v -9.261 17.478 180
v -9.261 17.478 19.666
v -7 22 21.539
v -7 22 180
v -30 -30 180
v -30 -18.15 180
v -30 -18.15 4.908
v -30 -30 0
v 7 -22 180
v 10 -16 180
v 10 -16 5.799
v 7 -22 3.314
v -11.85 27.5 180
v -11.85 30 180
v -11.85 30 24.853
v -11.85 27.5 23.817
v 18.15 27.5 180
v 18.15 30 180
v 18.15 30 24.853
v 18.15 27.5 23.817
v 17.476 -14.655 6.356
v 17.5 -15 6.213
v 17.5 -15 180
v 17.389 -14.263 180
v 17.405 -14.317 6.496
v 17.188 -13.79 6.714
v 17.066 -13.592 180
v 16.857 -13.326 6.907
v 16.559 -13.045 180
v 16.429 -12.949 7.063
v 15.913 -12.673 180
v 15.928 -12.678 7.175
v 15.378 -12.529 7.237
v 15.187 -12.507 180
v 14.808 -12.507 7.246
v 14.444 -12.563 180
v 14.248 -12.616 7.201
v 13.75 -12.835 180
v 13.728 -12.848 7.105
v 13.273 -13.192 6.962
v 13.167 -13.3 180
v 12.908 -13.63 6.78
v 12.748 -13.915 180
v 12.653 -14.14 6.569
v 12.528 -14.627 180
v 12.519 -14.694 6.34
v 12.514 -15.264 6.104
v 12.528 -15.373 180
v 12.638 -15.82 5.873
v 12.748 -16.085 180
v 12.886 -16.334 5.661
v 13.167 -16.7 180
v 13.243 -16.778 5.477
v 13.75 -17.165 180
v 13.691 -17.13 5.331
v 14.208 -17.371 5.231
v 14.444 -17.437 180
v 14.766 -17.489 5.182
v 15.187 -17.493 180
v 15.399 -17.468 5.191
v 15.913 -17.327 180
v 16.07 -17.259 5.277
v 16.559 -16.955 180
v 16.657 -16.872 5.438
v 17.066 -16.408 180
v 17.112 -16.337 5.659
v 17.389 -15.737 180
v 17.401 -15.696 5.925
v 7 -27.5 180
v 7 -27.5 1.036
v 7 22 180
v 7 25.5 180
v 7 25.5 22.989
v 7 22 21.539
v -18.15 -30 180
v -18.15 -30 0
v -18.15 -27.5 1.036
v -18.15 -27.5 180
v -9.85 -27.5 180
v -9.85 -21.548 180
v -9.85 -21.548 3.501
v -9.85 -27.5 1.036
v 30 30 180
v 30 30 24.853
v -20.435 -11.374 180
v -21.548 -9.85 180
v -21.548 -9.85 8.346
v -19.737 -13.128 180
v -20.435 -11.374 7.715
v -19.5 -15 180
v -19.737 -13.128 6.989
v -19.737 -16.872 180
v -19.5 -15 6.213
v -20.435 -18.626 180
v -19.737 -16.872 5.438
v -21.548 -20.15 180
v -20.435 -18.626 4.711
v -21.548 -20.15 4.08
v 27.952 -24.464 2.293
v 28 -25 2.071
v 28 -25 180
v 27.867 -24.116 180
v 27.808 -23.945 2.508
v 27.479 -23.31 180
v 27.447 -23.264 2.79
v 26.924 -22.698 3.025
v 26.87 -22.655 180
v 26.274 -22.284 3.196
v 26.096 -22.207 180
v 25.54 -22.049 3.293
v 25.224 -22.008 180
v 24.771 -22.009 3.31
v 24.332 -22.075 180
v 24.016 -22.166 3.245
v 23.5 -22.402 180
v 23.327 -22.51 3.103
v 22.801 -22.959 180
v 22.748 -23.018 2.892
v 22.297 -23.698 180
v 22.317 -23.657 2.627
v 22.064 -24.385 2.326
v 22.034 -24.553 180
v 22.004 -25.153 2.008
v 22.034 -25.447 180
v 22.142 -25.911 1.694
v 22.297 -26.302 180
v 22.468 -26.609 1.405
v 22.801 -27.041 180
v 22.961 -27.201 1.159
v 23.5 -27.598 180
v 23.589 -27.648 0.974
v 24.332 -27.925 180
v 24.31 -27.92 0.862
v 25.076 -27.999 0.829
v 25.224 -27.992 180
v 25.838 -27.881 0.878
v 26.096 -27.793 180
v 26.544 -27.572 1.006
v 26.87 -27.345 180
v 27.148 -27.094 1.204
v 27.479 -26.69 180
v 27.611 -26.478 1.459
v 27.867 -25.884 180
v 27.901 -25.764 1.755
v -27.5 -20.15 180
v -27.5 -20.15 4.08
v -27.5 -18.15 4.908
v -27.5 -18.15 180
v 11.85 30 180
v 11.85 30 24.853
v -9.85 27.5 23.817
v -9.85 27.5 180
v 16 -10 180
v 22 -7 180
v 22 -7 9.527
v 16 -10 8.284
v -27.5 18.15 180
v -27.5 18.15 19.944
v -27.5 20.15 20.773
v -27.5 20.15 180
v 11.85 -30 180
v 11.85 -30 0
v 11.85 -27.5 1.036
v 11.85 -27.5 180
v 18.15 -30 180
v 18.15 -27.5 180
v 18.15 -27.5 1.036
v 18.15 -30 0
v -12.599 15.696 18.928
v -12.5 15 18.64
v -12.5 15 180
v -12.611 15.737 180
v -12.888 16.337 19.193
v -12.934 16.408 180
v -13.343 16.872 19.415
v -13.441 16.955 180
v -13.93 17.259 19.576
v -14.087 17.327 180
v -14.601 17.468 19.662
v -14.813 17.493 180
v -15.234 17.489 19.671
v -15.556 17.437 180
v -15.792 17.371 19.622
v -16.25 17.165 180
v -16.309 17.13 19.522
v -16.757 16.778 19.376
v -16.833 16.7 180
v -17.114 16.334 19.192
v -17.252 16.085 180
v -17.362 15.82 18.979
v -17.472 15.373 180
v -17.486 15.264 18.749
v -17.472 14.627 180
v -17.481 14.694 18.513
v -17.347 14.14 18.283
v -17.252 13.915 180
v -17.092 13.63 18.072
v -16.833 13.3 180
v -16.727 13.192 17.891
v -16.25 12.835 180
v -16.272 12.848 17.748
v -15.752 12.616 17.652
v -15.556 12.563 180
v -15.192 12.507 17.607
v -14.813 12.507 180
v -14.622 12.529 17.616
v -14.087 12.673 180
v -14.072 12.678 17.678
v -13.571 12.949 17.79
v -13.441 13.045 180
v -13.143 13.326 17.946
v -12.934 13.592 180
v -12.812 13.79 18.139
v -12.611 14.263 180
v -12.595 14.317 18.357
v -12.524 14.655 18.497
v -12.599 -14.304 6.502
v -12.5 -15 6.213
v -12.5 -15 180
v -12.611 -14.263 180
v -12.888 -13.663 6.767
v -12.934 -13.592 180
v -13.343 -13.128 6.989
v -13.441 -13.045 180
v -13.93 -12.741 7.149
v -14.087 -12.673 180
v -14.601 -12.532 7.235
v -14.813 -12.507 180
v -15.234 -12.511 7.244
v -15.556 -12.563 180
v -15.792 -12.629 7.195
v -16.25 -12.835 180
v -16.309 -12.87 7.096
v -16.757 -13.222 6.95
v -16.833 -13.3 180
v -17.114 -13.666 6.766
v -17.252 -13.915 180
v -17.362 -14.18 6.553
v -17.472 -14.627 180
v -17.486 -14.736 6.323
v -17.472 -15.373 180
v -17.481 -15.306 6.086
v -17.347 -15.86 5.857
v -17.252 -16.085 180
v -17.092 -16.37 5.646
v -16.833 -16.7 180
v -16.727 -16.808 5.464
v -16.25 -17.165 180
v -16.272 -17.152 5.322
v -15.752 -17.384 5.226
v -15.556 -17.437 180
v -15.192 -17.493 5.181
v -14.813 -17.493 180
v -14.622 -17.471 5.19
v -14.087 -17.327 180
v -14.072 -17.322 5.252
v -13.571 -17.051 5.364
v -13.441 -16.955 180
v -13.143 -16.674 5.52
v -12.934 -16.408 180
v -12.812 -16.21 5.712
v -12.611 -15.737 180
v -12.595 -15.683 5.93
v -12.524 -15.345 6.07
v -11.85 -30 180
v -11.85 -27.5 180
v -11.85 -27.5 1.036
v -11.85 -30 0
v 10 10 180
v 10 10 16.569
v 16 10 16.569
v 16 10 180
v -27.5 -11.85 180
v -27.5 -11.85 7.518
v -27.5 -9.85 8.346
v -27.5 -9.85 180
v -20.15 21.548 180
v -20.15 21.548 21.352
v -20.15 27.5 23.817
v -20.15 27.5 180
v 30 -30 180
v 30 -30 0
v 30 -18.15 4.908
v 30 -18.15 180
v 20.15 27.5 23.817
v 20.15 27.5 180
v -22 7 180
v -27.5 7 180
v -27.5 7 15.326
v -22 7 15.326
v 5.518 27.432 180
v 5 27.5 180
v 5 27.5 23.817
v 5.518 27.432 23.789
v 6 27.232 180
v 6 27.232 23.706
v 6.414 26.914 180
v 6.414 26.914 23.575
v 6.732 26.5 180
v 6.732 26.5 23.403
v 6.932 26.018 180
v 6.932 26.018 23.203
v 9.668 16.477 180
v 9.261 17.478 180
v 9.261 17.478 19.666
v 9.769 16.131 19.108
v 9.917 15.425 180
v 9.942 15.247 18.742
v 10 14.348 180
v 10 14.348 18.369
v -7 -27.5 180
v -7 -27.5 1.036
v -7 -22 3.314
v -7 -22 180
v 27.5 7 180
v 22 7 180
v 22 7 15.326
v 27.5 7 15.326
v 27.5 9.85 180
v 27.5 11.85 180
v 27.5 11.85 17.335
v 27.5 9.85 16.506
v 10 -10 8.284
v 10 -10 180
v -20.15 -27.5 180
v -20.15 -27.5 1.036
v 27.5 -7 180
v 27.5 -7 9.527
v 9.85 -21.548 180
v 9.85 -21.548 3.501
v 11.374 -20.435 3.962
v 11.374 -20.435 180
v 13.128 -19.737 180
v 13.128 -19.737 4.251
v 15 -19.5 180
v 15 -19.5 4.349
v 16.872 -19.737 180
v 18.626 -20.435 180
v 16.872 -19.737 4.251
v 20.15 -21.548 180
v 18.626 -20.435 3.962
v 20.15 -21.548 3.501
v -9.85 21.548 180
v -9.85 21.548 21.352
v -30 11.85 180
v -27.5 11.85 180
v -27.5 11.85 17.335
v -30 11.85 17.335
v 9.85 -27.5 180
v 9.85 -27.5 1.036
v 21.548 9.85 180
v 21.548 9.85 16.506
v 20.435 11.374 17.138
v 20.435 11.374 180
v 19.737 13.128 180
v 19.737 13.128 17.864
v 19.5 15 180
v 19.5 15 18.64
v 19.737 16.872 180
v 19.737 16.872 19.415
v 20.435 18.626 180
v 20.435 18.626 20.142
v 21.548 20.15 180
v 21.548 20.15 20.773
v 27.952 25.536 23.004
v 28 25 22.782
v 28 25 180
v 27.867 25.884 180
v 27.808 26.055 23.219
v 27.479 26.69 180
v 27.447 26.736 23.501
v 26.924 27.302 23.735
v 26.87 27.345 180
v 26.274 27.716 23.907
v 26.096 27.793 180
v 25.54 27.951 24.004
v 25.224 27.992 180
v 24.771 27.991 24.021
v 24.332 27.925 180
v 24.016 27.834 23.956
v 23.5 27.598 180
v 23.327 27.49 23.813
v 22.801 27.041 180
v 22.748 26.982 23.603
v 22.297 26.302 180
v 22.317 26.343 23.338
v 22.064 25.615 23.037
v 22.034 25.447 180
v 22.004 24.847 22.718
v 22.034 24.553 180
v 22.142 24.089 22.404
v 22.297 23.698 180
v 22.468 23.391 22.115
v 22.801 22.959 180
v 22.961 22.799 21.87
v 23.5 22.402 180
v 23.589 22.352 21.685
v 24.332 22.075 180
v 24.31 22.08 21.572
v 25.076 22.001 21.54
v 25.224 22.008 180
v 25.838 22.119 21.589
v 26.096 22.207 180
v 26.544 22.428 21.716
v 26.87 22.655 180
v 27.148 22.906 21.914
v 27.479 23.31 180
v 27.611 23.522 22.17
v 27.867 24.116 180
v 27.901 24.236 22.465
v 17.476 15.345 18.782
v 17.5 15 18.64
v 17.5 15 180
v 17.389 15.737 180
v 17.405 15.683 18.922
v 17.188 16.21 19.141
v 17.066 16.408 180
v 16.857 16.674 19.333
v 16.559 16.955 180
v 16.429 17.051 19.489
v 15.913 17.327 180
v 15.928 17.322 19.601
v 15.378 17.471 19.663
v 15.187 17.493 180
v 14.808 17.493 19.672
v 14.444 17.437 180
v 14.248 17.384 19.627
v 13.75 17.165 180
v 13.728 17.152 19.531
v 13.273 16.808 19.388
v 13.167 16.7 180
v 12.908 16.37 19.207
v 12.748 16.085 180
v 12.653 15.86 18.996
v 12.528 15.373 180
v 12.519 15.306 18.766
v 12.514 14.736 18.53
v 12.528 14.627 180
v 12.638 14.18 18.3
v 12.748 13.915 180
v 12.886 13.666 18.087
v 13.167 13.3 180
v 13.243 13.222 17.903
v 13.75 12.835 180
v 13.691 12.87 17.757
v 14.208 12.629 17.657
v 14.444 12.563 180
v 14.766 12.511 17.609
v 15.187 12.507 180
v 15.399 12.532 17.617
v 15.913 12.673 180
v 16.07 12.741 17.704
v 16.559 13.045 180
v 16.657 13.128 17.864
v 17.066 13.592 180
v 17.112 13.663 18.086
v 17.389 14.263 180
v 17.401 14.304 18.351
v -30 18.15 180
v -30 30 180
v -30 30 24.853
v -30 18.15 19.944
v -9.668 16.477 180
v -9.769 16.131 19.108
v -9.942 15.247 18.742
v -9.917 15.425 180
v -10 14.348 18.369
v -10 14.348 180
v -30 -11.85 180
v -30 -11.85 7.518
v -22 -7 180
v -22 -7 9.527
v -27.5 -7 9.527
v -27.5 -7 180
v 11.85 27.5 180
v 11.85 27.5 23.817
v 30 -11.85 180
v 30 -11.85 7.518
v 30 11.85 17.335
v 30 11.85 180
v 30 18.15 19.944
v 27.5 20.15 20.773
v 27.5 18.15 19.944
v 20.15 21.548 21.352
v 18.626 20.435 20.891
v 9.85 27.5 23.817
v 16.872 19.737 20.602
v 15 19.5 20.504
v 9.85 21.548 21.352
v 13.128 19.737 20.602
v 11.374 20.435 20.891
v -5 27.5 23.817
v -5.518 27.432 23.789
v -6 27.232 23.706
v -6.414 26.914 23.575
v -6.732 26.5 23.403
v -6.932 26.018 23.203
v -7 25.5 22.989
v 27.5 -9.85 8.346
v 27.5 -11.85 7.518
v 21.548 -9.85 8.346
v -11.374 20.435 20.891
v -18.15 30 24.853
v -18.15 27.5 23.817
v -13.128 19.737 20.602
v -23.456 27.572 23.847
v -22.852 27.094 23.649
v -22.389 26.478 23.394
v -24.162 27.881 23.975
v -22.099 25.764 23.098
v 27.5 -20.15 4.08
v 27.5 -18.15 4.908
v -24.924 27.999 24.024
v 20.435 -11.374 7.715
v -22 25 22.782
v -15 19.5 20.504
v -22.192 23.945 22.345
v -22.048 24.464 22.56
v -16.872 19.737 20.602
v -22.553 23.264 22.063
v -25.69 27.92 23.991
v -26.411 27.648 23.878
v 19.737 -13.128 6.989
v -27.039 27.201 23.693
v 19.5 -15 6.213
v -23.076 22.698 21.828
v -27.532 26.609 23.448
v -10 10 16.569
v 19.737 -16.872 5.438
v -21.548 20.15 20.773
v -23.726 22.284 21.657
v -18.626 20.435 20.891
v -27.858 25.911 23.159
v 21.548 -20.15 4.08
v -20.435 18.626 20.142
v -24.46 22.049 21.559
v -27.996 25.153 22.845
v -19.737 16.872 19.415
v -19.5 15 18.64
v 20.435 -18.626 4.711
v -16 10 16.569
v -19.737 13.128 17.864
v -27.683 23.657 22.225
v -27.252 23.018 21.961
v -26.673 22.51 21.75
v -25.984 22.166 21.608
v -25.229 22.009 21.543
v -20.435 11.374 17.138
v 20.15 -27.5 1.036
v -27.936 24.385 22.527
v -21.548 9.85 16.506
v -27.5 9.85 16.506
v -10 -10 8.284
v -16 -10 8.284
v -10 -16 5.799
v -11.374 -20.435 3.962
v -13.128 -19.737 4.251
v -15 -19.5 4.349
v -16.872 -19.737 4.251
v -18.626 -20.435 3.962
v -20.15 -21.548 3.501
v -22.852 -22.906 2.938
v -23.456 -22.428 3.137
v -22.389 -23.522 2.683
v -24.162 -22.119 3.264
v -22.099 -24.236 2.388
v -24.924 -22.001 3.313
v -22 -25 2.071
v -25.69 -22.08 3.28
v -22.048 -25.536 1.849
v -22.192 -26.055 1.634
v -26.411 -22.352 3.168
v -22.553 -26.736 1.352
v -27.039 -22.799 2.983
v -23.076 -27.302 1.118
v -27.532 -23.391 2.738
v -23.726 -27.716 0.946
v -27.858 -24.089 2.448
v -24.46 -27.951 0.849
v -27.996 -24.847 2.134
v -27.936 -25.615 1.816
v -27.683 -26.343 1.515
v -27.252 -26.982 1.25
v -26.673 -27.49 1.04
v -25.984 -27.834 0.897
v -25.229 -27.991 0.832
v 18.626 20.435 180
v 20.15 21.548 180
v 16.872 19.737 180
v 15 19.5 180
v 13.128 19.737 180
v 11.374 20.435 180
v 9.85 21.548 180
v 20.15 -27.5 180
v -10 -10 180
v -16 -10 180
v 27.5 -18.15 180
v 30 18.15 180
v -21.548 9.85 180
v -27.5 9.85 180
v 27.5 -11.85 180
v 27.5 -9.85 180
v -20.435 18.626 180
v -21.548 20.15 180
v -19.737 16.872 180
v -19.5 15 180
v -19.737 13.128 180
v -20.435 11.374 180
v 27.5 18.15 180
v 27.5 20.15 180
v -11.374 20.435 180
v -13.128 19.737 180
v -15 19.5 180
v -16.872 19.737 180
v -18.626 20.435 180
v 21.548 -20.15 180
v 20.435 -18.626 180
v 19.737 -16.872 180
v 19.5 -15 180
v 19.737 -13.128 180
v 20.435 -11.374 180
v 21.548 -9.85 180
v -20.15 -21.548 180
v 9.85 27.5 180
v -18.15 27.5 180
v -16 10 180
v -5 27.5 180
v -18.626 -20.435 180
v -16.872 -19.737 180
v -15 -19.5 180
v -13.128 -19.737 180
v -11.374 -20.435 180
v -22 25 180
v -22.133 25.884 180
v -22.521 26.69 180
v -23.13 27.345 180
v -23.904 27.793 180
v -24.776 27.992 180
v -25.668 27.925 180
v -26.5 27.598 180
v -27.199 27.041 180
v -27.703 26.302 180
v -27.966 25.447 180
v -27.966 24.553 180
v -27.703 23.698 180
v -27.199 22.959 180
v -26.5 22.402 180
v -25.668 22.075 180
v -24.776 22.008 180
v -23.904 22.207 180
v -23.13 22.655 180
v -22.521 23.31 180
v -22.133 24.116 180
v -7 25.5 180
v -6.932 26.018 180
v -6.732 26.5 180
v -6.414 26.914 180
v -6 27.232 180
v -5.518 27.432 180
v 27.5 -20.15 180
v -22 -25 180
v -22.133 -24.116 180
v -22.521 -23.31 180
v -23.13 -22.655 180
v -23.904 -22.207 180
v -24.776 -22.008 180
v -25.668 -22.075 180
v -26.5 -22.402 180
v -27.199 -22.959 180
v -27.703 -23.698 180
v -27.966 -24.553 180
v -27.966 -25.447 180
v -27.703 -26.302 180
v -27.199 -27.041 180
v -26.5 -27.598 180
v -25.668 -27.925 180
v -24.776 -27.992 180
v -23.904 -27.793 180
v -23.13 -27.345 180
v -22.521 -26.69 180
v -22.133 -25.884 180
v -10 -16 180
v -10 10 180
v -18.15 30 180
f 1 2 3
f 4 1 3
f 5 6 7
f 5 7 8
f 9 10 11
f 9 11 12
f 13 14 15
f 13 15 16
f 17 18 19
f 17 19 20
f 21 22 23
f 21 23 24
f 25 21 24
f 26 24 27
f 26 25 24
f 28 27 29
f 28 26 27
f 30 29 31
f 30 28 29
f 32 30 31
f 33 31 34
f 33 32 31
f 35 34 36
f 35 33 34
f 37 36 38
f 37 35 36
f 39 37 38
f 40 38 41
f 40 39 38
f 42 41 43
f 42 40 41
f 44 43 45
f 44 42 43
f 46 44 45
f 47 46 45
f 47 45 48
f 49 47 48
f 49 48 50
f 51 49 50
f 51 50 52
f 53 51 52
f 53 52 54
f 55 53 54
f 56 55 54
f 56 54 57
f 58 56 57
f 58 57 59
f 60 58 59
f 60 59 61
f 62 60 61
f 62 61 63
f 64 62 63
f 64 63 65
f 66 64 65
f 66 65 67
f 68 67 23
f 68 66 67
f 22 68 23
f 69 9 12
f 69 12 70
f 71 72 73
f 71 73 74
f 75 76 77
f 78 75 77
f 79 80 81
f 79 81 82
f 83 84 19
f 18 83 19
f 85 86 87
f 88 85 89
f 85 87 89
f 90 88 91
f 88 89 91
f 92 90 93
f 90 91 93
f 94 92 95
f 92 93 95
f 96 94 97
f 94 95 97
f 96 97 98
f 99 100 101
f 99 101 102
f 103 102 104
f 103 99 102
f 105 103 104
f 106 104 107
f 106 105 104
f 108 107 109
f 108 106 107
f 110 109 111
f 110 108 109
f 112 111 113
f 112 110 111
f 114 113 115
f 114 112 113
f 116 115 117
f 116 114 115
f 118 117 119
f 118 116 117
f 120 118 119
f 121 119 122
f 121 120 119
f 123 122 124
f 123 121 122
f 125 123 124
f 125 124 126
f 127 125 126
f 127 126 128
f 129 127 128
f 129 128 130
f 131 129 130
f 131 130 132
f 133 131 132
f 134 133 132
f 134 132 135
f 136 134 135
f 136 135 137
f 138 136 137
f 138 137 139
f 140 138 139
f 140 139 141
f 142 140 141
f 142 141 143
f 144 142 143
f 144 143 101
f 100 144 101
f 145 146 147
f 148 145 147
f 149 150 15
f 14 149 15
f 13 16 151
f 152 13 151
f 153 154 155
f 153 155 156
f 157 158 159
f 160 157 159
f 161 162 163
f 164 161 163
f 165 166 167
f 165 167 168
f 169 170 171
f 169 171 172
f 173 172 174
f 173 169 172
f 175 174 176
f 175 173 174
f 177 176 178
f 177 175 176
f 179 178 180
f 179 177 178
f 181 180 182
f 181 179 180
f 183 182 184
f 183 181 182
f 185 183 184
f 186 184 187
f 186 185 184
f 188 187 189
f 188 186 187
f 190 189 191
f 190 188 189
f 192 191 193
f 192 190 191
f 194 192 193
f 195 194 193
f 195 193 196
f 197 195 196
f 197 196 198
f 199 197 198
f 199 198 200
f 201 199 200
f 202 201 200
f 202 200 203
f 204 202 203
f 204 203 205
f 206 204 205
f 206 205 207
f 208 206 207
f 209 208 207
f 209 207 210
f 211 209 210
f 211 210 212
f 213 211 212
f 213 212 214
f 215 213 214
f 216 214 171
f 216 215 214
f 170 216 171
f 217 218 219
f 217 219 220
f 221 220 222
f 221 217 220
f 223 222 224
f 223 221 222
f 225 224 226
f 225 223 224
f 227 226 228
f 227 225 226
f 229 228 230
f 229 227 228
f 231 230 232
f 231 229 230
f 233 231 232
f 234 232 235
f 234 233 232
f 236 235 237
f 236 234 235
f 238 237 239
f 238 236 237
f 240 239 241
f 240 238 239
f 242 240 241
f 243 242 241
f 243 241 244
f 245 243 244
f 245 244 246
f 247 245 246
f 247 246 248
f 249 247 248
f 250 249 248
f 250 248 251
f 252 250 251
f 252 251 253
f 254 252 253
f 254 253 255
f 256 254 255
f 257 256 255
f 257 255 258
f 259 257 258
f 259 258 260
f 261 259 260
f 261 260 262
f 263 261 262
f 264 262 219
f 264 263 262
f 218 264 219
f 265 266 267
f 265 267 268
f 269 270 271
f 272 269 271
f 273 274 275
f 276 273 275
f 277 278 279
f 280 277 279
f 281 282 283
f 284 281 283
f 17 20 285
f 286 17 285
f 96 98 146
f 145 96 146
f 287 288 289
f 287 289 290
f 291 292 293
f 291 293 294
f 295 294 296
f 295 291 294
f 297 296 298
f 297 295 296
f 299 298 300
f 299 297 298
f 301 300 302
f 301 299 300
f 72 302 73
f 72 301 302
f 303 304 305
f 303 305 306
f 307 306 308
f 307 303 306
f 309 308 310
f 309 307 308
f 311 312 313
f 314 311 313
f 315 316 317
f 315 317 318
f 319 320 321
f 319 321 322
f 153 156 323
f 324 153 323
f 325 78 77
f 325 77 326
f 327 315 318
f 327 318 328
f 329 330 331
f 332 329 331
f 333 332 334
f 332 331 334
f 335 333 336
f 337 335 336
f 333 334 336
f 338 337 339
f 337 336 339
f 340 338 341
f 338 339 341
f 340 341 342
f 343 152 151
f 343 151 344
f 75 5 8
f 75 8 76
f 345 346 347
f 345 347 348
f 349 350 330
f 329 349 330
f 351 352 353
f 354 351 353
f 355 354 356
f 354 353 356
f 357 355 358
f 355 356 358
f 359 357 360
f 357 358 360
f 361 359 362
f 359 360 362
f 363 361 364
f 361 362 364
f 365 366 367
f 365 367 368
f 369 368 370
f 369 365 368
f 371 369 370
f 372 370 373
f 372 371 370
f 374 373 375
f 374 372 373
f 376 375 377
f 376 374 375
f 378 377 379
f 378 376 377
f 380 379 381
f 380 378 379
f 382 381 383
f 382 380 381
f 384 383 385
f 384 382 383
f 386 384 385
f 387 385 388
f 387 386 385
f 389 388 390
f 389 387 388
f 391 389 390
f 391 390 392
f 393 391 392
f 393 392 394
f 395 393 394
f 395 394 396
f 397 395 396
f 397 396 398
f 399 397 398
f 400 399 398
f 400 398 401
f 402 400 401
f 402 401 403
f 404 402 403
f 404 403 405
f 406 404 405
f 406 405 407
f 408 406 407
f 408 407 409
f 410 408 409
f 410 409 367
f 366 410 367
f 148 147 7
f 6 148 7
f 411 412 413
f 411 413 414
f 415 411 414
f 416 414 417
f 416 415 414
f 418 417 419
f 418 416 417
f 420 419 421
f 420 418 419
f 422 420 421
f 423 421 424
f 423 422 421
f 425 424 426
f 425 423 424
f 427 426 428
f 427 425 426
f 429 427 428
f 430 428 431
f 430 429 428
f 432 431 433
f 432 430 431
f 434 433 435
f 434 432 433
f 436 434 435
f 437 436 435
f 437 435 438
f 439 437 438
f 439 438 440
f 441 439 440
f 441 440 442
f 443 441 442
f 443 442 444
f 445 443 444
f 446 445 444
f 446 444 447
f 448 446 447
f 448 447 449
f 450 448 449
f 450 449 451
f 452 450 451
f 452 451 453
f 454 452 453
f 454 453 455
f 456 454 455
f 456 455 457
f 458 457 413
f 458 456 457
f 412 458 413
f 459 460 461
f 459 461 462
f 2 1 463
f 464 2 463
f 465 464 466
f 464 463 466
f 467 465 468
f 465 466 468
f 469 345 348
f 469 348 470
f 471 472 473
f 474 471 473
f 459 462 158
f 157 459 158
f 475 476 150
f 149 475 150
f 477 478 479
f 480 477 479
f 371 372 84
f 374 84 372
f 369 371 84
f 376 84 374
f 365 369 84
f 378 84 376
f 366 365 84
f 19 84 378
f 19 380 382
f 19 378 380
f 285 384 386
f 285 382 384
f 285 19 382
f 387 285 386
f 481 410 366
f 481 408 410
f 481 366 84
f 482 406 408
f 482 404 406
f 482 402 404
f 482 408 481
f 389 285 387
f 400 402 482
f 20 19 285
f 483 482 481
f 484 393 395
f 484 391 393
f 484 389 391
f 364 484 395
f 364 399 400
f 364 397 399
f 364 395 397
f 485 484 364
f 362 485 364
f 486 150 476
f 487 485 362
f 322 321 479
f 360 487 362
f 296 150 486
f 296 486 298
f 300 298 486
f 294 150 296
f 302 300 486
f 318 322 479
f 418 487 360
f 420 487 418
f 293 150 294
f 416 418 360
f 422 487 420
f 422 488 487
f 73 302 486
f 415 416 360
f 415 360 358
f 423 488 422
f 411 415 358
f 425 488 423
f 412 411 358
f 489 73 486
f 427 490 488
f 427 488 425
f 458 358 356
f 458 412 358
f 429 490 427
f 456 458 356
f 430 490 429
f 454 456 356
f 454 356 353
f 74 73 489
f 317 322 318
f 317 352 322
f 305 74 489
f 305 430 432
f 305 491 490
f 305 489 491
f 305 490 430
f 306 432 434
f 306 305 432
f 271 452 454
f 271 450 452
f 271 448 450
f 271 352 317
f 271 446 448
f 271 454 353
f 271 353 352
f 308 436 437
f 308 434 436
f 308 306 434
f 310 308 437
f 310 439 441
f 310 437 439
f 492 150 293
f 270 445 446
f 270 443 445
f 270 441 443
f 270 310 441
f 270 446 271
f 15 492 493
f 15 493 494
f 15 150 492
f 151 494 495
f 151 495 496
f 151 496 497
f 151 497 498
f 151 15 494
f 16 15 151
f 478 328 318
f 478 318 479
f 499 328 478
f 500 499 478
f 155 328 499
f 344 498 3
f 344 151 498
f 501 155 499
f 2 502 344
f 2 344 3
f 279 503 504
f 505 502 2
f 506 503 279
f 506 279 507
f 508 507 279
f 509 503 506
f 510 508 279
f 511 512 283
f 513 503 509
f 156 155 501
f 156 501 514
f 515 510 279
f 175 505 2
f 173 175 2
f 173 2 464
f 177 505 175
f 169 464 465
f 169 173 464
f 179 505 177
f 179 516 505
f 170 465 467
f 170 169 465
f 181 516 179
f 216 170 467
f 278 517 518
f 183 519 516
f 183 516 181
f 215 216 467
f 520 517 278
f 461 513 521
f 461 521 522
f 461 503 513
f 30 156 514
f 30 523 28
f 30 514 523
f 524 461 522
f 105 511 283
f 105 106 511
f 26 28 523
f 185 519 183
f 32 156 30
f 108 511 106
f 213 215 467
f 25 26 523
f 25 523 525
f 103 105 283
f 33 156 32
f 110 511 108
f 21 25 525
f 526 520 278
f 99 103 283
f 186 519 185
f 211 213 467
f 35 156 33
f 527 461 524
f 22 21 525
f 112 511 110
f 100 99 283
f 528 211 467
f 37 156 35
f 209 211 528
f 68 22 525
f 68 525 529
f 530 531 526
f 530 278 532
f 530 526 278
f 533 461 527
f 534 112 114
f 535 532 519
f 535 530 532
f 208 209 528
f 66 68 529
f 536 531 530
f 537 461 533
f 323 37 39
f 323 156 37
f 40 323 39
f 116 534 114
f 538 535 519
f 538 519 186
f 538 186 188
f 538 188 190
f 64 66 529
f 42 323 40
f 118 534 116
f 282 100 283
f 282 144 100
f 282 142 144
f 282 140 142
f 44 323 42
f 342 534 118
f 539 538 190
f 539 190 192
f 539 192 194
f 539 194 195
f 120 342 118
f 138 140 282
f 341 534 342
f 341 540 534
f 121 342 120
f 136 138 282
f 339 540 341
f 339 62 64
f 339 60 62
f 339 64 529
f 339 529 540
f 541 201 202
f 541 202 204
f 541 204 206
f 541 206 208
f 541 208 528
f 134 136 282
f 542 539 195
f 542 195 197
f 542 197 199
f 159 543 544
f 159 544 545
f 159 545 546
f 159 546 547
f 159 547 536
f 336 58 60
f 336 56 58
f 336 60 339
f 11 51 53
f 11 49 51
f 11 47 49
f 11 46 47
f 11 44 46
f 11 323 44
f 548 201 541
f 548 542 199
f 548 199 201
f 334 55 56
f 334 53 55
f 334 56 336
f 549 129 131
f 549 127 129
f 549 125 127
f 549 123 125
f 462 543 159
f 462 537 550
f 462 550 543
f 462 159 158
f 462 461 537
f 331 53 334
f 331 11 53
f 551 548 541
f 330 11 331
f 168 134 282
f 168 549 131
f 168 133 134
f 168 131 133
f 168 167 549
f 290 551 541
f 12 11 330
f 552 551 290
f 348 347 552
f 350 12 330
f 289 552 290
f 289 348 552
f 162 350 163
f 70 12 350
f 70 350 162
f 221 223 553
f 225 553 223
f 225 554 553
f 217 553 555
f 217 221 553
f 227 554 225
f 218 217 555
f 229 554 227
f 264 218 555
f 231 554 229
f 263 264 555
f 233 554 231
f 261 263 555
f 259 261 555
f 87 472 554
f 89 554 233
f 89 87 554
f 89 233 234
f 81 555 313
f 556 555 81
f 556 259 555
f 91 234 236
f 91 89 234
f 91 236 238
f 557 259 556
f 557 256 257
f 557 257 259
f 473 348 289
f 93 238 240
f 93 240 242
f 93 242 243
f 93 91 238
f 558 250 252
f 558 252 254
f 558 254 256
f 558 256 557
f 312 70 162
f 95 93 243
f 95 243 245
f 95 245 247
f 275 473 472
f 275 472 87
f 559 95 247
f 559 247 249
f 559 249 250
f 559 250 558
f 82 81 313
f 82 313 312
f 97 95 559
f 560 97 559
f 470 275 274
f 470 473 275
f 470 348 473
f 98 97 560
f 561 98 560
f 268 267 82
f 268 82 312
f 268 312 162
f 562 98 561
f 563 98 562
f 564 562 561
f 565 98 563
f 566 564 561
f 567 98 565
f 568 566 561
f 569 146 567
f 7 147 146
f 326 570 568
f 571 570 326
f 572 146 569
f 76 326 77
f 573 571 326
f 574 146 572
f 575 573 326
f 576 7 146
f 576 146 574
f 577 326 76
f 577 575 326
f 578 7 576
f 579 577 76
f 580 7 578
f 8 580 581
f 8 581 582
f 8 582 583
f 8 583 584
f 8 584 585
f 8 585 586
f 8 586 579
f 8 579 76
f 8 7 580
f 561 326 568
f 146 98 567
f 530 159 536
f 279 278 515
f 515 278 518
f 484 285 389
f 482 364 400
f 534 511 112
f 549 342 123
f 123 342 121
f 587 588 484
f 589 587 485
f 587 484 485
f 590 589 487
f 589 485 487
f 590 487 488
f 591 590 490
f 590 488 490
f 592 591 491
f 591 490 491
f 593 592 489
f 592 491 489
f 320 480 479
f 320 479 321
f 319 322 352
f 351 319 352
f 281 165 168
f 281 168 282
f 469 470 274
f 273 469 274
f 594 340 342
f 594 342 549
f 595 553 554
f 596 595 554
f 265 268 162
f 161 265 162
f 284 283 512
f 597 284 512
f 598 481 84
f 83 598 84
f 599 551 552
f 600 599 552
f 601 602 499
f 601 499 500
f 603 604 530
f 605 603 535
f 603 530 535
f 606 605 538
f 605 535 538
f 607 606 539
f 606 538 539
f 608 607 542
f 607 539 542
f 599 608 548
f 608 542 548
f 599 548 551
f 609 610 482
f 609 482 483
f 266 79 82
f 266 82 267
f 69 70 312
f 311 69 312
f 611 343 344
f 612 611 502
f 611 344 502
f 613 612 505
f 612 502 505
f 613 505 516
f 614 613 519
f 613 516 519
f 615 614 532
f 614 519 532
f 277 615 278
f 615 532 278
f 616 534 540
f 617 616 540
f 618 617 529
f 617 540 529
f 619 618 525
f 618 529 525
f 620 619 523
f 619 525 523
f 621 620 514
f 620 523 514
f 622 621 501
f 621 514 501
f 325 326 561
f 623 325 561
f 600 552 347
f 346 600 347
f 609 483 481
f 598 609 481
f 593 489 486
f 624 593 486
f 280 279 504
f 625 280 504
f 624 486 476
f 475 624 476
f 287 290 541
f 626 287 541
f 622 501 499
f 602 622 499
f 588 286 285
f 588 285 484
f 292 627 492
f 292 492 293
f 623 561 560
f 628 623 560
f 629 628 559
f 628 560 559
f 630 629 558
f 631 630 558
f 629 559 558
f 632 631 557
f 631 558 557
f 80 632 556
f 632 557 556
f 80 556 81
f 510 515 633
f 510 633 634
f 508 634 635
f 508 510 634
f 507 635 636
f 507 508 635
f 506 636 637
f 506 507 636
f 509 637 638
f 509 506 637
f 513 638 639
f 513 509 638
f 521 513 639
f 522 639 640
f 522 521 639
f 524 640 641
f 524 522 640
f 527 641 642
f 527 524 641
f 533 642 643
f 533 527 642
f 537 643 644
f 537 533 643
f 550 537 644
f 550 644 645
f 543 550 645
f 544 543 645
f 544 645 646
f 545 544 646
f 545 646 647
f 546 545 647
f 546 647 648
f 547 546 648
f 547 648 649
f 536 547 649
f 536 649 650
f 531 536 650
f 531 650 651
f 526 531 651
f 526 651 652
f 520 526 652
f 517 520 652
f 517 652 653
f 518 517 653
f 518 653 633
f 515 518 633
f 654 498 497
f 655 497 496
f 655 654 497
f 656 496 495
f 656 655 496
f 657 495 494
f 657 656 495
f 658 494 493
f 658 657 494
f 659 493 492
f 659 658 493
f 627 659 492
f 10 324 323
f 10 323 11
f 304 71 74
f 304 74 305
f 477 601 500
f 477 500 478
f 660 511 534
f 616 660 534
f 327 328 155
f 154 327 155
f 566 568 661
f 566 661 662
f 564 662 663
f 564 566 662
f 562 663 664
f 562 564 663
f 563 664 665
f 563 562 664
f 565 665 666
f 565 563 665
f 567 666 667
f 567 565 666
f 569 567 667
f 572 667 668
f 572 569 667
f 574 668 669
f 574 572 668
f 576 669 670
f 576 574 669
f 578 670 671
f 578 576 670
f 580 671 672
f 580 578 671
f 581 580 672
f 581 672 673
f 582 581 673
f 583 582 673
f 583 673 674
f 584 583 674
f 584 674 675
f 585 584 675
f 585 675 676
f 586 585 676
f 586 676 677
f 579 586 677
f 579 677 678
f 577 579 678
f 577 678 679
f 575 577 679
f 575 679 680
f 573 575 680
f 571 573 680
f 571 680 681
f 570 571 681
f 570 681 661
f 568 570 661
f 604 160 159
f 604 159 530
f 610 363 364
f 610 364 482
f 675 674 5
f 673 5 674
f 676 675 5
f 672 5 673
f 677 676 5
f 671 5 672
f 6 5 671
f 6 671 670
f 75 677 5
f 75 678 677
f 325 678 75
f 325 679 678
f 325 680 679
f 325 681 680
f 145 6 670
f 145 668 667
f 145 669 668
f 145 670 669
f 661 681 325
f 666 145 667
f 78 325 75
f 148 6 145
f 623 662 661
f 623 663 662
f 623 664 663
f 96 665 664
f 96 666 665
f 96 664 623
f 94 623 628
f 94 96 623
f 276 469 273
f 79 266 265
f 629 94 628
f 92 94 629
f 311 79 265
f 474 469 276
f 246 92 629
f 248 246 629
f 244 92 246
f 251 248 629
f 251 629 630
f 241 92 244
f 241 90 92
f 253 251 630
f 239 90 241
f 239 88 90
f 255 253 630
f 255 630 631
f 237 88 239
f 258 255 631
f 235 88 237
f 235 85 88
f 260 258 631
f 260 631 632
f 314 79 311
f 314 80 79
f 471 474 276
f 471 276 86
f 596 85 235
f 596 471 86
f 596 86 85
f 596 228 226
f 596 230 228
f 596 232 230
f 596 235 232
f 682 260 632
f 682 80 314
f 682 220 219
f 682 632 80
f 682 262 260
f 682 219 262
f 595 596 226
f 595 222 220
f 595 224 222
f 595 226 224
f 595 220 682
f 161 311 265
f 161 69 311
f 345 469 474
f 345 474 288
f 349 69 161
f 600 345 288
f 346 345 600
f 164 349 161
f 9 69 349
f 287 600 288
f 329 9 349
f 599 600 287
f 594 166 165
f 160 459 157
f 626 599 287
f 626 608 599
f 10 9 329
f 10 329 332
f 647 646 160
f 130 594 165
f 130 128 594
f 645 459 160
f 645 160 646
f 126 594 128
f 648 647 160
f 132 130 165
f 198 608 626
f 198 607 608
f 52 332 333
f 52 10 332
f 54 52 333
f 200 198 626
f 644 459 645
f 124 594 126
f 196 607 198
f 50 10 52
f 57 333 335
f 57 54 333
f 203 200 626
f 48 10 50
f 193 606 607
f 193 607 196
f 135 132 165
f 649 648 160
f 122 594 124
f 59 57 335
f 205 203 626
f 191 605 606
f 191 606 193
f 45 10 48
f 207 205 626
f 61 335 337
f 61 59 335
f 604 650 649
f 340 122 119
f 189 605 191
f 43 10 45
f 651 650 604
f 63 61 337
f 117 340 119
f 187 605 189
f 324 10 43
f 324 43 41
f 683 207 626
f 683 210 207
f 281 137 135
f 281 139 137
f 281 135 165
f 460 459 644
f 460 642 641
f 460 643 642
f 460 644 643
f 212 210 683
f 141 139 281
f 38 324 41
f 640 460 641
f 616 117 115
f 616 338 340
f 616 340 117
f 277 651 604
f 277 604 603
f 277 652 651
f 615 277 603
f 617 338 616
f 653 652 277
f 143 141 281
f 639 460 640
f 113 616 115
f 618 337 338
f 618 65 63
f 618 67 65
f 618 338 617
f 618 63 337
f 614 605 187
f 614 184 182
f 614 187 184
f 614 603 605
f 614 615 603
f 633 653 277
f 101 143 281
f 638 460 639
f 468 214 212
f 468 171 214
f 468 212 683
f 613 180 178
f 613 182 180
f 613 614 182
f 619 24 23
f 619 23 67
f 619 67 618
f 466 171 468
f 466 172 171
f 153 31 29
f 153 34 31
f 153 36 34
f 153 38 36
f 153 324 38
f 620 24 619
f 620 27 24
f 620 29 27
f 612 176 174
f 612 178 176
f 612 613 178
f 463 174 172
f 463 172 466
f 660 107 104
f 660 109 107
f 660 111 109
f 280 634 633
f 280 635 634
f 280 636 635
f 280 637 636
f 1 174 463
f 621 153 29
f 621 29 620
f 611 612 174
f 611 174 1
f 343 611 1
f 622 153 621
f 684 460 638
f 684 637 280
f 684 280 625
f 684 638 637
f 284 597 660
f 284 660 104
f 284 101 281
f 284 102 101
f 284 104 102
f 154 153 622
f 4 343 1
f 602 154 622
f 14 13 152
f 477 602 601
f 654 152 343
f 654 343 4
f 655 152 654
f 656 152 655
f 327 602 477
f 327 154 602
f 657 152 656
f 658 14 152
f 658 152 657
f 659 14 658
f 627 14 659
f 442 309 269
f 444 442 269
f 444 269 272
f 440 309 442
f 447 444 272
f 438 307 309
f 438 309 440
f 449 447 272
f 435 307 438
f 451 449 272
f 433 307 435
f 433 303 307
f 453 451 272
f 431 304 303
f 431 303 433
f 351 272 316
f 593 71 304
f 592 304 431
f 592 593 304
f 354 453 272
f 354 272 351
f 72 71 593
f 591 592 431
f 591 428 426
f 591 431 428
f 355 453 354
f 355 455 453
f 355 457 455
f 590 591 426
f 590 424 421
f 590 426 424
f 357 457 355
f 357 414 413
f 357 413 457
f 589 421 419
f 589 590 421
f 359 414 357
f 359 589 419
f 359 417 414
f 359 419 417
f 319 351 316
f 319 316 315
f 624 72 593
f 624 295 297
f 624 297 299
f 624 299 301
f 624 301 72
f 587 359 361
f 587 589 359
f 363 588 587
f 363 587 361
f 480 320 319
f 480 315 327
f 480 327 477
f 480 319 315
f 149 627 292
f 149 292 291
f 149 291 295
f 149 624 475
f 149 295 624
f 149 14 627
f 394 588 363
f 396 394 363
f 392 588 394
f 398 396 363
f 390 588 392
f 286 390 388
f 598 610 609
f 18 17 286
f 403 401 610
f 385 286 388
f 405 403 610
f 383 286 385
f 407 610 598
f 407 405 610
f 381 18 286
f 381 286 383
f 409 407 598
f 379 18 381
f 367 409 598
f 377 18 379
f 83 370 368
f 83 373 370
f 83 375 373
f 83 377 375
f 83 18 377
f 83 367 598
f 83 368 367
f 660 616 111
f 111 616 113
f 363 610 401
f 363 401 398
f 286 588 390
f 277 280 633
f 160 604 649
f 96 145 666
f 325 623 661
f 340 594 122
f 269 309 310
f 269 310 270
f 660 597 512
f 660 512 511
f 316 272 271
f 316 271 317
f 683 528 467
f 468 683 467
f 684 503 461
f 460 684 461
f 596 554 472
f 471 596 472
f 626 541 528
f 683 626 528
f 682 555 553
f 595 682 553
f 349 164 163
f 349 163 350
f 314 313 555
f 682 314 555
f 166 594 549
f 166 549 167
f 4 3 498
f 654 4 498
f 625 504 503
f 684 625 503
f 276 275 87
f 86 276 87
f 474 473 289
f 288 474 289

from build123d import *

# Parameters (mm, degrees)
F0_R          = 3
F0_R_2        = 2.5
F1_DEPTH      = 180
F2_R          = 2
F3_R          = 7
F6_DEPTH      = 30
F6_DEPTH_BACK = 30


# Not quite as in the source:
# - a feature names something its author has since deleted; it is built from what else it names


with BuildPart() as f1:
    # F0 (on Top) → F1 (new body)
    with BuildSketch(Plane.XY):
        with BuildLine():
            Line((18.15, -30), (30, -30))
            Line((30, -30), (30, -18.15))
            Line((30, -18.15), (27.5, -18.15))
            Line((27.5, -18.15), (27.5, -20.15))
            Line((27.5, -20.15), (21.5477069044, -20.15))
            ThreePointArc((21.5477069044, -20.15), (19.5, -15), (21.5477069044, -9.85))
            Line((21.5477069044, -9.85), (27.5, -9.85))
            Line((27.5, -9.85), (27.5, -11.85))
            Line((27.5, -11.85), (30, -11.85))
            Line((30, -11.85), (30, 11.85))
            Line((30, 11.85), (27.5, 11.85))
            Line((27.5, 11.85), (27.5, 9.85))
            Line((27.5, 9.85), (21.5477069044, 9.85))
            ThreePointArc((21.5477069044, 9.85), (19.5, 15), (21.5477069044, 20.15))
            Line((21.5477069044, 20.15), (27.5, 20.15))
            Line((27.5, 20.15), (27.5, 18.15))
            Line((27.5, 18.15), (30, 18.15))
            Line((30, 18.15), (30, 30))
            Line((30, 30), (18.15, 30))
            Line((18.15, 30), (18.15, 27.5))
            Line((18.15, 27.5), (20.15, 27.5))
            Line((20.15, 27.5), (20.15, 21.5477069044))
            ThreePointArc((20.15, 21.5477069044), (15, 19.5), (9.85, 21.5477069044))
            Line((9.85, 21.5477069044), (9.85, 27.5))
            Line((9.85, 27.5), (11.85, 27.5))
            Line((11.85, 27.5), (11.85, 30))
            Line((11.85, 30), (-11.85, 30))
            Line((-11.85, 30), (-11.85, 27.5))
            Line((-11.85, 27.5), (-9.85, 27.5))
            Line((-9.85, 27.5), (-9.85, 21.5477069044))
            ThreePointArc((-9.85, 21.5477069044), (-15, 19.5), (-20.15, 21.5477069044))
            Line((-20.15, 21.5477069044), (-20.15, 27.5))
            Line((-20.15, 27.5), (-18.15, 27.5))
            Line((-18.15, 27.5), (-18.15, 30))
            Line((-18.15, 30), (-30, 30))
            Line((-30, 30), (-30, 18.15))
            Line((-30, 18.15), (-27.5, 18.15))
            Line((-27.5, 18.15), (-27.5, 20.15))
            Line((-27.5, 20.15), (-21.5477069044, 20.15))
            ThreePointArc((-21.5477069044, 20.15), (-19.5, 15), (-21.5477069044, 9.85))
            Line((-21.5477069044, 9.85), (-27.5, 9.85))
            Line((-27.5, 9.85), (-27.5, 11.85))
            Line((-27.5, 11.85), (-30, 11.85))
            Line((-30, 11.85), (-30, -11.85))
            Line((-30, -11.85), (-27.5, -11.85))
            Line((-27.5, -11.85), (-27.5, -9.85))
            Line((-27.5, -9.85), (-21.5477069044, -9.85))
            ThreePointArc((-21.5477069044, -9.85), (-19.5, -15), (-21.5477069044, -20.15))
            Line((-21.5477069044, -20.15), (-27.5, -20.15))
            Line((-27.5, -20.15), (-27.5, -18.15))
            Line((-27.5, -18.15), (-30, -18.15))
            Line((-30, -18.15), (-30, -30))
            Line((-30, -30), (-18.15, -30))
            Line((-18.15, -30), (-18.15, -27.5))
            Line((-18.15, -27.5), (-20.15, -27.5))
            Line((-20.15, -27.5), (-20.15, -21.5477069044))
            ThreePointArc((-20.15, -21.5477069044), (-15, -19.5), (-9.85, -21.5477069044))
            Line((-9.85, -21.5477069044), (-9.85, -27.5))
            Line((-9.85, -27.5), (-11.85, -27.5))
            Line((-11.85, -27.5), (-11.85, -30))
            Line((-11.85, -30), (11.85, -30))
            Line((11.85, -30), (11.85, -27.5))
            Line((11.85, -27.5), (9.85, -27.5))
            Line((9.85, -27.5), (9.85, -21.5477069044))
            ThreePointArc((9.85, -21.5477069044), (15, -19.5), (20.15, -21.5477069044))
            Line((20.15, -21.5477069044), (20.15, -27.5))
            Line((20.15, -27.5), (18.15, -27.5))
            Line((18.15, -27.5), (18.15, -30))
        make_face()
        with Locations((-25, -25)):
            Circle(F0_R, mode=Mode.SUBTRACT)
        with Locations((-15, -15)):
            Circle(F0_R_2, mode=Mode.SUBTRACT)
        with Locations((25, -25)):
            Circle(F0_R, mode=Mode.SUBTRACT)
        with Locations((15, -15)):
            Circle(F0_R_2, mode=Mode.SUBTRACT)
        with Locations((-25, 25)):
            Circle(F0_R, mode=Mode.SUBTRACT)
        with Locations((-15, 15)):
            Circle(F0_R_2, mode=Mode.SUBTRACT)
        Polygon((-7, 22), (-7, 27.5), (0, 27.5), (7, 27.5), (7, 22), (10, 16), (10, 10), (16, 10), (22, 7), (27.5, 7), (27.5, 0), (27.5, -7), (22, -7), (16, -10), (10, -10), (10, -16), (7, -22), (7, -27.5), (0, -27.5), (-7, -27.5), (-7, -22), (-10, -16), (-10, -10), (-16, -10), (-22, -7), (-27.5, -7), (-27.5, 0), (-27.5, 7), (-22, 7), (-16, 10), (-10, 10), (-10, 16), align=None, mode=Mode.SUBTRACT)
        with Locations((15, 15)):
            Circle(F0_R_2, mode=Mode.SUBTRACT)
        with Locations((25, 25)):
            Circle(F0_R, mode=Mode.SUBTRACT)
    extrude(amount=F1_DEPTH)

    # F2
    f2_edges = [f1.edges().sort_by_distance(p)[0] for p in [
        (-7, 27.5, 90),
        (7, 27.5, 90),
    ]]
    fillet(f2_edges, radius=F2_R)

    # F3
    f3_edges = [f1.edges().sort_by_distance(p)[0] for p in [
        (-10, 16, 90),
        (10, 16, 90),
    ]]
    fillet(f3_edges, radius=F3_R)

    # F5 (on Right) → F6 (cut, two sides)
    with BuildSketch(Plane.YZ) as f6_sk:
        Polygon((189.0217391842, -31.0070544887), (145.9840988475, 72.8950005046), (-30, 0), (13.0376403367, -103.9020549933), align=None)
    extrude(amount=-F6_DEPTH, mode=Mode.SUBTRACT)
    extrude(f6_sk.sketch, amount=F6_DEPTH_BACK, mode=Mode.SUBTRACT)


solid = f1.part
